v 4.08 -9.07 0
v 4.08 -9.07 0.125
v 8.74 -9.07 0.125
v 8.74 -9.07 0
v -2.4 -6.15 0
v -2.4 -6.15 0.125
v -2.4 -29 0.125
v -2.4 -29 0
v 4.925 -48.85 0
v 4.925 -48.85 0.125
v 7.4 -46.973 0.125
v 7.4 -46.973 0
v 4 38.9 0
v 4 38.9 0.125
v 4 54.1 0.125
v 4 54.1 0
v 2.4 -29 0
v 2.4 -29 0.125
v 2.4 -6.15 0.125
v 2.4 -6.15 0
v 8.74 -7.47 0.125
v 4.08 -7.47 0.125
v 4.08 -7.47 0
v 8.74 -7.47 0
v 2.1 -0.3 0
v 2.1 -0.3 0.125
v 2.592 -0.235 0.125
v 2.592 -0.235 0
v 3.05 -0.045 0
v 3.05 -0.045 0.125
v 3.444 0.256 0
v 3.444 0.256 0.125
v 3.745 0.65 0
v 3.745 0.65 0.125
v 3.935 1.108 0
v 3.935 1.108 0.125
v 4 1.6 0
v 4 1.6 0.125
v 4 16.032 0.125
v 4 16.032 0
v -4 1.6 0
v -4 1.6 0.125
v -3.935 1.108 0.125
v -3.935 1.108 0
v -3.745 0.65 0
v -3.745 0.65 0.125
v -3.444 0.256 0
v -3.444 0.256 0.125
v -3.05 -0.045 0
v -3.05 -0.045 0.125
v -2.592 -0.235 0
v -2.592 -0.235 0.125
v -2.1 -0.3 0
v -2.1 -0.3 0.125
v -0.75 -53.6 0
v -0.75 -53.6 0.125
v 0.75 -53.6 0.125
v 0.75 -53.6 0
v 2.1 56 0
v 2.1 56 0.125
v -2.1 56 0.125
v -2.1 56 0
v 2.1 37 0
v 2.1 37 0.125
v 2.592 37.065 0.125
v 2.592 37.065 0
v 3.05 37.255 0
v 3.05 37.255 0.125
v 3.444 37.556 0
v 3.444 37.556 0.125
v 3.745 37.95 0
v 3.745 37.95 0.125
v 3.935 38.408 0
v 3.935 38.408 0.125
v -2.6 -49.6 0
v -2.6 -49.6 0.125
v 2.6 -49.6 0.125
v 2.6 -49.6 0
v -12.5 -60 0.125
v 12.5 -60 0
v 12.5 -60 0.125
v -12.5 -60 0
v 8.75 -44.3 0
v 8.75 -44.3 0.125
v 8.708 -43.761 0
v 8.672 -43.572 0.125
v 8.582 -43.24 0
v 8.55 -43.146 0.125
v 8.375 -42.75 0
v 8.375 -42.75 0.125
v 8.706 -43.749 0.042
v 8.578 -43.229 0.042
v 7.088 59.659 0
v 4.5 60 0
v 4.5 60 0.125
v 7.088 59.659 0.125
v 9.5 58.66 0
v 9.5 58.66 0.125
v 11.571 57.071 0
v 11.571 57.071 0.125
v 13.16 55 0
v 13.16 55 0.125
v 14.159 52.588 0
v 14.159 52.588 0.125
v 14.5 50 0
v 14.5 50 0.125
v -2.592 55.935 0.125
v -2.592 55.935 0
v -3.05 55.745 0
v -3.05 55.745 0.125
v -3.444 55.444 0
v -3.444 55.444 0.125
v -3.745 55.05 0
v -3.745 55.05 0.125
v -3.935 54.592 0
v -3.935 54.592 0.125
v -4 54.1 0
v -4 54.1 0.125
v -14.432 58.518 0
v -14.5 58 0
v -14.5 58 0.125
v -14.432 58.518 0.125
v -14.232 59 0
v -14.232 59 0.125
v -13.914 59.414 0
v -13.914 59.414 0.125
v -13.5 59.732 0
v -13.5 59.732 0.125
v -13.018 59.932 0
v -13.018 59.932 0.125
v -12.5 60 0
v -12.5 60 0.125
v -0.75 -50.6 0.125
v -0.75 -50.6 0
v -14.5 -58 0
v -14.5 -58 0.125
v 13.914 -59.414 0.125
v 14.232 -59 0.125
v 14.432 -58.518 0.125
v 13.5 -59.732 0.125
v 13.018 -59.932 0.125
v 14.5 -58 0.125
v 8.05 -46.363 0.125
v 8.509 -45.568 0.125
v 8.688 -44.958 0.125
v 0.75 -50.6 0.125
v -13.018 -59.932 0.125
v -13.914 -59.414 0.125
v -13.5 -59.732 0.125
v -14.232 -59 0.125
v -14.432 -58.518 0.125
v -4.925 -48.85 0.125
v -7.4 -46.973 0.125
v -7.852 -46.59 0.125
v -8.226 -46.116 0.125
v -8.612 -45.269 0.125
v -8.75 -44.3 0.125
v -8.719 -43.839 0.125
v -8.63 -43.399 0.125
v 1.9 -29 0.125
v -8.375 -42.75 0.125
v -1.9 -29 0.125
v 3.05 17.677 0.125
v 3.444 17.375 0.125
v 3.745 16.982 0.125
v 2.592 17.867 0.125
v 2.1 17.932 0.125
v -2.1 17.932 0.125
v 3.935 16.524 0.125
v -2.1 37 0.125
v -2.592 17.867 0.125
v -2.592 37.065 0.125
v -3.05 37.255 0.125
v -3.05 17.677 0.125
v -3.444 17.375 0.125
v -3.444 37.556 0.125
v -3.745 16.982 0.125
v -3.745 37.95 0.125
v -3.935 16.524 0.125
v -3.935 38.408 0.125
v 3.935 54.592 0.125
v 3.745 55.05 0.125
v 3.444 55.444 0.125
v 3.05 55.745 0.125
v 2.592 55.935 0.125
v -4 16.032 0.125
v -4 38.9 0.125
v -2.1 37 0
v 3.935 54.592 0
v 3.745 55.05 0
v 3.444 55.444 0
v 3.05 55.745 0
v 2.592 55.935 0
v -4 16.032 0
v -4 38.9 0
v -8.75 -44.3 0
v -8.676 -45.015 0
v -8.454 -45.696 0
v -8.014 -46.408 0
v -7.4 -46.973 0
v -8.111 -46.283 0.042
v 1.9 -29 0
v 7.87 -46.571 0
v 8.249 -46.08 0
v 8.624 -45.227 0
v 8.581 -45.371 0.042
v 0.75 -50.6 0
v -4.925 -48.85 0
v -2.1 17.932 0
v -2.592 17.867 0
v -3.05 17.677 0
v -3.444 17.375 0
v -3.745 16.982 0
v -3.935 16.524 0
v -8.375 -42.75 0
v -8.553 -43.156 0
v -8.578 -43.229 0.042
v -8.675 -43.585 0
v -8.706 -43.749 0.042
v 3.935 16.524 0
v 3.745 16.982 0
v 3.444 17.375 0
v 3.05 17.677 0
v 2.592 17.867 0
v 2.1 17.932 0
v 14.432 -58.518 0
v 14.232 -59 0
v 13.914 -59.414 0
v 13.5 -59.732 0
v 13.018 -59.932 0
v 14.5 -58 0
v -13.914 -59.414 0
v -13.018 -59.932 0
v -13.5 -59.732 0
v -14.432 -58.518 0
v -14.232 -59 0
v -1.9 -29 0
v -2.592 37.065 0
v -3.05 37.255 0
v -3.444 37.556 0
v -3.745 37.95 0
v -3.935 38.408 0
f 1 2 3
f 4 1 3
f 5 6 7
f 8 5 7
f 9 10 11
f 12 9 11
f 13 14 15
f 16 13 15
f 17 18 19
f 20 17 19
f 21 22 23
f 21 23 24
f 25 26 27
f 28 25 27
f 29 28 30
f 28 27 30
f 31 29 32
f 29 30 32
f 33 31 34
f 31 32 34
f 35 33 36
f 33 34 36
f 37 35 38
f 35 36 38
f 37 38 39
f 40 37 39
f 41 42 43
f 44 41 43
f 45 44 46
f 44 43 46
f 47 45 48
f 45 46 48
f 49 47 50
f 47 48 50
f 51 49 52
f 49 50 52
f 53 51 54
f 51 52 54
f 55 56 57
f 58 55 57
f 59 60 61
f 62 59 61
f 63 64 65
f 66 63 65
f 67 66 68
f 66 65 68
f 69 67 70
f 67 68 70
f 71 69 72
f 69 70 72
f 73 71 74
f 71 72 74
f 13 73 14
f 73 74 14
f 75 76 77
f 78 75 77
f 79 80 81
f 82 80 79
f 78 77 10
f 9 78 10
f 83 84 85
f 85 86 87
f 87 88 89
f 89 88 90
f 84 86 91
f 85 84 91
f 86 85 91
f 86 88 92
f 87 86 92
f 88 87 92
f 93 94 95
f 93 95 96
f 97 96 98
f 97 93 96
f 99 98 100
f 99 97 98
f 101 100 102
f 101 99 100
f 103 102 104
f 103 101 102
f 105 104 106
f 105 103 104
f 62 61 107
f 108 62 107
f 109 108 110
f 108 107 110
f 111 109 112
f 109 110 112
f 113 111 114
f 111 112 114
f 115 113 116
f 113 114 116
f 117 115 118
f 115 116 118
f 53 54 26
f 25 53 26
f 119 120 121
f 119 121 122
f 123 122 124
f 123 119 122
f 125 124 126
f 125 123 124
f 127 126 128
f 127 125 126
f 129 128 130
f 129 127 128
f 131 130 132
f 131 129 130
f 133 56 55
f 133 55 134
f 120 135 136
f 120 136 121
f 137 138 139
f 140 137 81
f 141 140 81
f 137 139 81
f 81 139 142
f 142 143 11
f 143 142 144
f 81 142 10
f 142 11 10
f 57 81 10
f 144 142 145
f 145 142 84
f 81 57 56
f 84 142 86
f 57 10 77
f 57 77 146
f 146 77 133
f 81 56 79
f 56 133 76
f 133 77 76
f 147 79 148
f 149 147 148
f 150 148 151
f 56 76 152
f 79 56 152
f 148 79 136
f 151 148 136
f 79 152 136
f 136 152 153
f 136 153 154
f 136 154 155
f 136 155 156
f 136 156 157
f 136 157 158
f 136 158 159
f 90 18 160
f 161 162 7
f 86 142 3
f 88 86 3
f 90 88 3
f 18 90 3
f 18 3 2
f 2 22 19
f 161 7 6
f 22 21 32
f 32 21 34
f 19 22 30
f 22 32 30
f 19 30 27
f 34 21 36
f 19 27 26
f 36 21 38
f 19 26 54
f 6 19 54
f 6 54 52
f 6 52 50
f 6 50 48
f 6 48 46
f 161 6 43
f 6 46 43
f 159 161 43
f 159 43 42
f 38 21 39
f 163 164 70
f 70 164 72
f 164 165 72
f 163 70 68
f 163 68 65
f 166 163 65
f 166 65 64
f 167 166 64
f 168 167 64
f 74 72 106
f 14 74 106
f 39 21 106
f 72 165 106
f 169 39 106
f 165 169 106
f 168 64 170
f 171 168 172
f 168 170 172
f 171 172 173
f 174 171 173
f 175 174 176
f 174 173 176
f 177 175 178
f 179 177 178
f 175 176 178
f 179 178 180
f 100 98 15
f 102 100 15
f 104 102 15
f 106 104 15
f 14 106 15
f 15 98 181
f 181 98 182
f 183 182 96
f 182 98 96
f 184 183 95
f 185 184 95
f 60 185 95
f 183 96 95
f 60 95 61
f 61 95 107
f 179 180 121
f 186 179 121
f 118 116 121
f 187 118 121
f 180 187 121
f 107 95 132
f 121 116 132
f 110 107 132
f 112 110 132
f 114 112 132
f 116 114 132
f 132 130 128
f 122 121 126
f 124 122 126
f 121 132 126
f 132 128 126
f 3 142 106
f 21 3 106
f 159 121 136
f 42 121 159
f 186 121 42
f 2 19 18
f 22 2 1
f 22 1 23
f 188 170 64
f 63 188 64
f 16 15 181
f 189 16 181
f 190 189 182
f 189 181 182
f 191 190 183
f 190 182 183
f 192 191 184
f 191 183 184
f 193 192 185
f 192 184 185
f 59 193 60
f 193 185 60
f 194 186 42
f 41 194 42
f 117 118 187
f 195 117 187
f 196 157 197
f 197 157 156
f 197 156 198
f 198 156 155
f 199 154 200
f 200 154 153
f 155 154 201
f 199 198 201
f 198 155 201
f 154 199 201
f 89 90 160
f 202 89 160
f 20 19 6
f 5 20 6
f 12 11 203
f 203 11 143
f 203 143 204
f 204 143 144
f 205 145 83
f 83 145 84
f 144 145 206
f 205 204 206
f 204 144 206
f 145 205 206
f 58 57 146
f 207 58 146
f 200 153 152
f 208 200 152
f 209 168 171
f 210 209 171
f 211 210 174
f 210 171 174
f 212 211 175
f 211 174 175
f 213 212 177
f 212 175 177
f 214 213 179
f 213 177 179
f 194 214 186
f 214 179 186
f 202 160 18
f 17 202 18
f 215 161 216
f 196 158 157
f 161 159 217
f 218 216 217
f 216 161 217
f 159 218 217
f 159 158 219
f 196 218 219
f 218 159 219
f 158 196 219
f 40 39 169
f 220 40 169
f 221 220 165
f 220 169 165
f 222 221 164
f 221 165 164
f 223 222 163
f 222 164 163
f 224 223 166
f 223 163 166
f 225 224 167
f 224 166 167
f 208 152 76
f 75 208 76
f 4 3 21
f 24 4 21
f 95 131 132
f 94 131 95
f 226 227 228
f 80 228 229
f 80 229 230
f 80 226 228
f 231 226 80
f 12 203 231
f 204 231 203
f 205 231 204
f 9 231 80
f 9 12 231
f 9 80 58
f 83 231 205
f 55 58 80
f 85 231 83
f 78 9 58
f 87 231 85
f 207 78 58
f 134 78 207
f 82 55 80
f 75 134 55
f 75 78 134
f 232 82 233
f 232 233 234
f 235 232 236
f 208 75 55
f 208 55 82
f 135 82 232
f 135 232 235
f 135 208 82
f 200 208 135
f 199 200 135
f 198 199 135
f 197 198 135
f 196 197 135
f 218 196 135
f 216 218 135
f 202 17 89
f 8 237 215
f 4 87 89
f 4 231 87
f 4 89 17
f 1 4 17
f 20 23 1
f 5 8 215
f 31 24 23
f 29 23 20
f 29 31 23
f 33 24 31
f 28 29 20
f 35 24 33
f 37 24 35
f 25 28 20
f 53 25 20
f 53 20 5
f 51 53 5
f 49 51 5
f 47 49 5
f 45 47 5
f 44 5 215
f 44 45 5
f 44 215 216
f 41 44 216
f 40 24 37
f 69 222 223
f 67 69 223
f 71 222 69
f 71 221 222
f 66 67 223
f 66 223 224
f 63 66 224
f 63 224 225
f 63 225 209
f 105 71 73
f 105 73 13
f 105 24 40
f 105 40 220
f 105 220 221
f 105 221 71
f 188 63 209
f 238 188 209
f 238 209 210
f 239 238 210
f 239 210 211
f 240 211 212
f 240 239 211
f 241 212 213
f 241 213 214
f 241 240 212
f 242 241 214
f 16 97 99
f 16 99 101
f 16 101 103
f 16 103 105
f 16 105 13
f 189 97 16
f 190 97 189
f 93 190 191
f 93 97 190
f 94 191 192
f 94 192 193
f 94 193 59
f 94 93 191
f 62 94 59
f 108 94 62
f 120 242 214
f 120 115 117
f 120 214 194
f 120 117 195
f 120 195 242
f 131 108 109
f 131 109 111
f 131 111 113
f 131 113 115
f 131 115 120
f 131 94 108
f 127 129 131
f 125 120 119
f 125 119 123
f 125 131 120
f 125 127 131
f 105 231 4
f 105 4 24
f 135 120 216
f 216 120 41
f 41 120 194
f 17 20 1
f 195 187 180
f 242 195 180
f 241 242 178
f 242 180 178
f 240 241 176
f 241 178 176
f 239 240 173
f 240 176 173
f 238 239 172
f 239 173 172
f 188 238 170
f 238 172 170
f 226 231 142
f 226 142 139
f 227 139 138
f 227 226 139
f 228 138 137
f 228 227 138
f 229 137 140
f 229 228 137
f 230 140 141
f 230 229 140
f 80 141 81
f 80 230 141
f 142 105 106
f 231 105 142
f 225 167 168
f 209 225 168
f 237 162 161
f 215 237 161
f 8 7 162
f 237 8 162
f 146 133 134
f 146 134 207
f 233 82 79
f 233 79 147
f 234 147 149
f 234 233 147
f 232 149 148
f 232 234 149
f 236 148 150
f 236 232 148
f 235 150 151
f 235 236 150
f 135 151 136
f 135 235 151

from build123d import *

# Parameters (mm, degrees)
BOSS_EXTRUDE5_DEPTH = 0.125
SKETCH1_W           = 1.5
SKETCH1_H           = 3
SKETCH1_W_2         = 4.66
SKETCH1_H_2         = 1.6
CUT_EXTRUDE2_DEPTH  = 62.727349085


with BuildPart() as part:
    # Sketch8 → Boss-Extrude5 (new body)
    with BuildSketch(Plane.XY):
        with BuildLine():
            Line((-12.5, 60), (4.5, 60))
            ThreePointArc((4.5, 60), (11.571067812, 57.071067812), (14.5, 50))
            Line((14.5, 50), (14.5, -58))
            ThreePointArc((14.5, -58), (13.914213562, -59.414213562), (12.5, -60))
            Line((12.5, -60), (-12.5, -60))
            ThreePointArc((-12.5, -60), (-13.914213562, -59.414213562), (-14.5, -58))
            Line((-14.5, -58), (-14.5, 58))
            ThreePointArc((-14.5, 58), (-13.914213562, 59.414213562), (-12.5, 60))
        make_face()
    extrude(amount=BOSS_EXTRUDE5_DEPTH)

    # Sketch1 → Cut-Extrude2 (cut, through all)
    with BuildSketch(Plane.XY.offset(0.125)):
        with BuildLine():
            Line((2.6, -49.6), (4.925, -48.85))
            Line((4.925, -48.85), (7.4, -46.97314145))
            add(Edge.make_bspline(
                [(7.4, -46.97314145), (8.211440188, -46.416320927), (8.75059415, -45.427724457), (8.749703343, -43.736930638), (8.614001568, -43.20601542), (8.375, -42.75)],
                knots=[3, 3, 3, 3, 3.998304655, 3.998304655, 4.496755106, 4.496755106, 4.496755106, 4.496755106], degree=3))
            Line((8.375, -42.75), (1.9, -29))
            Line((1.9, -29), (2.4, -29))
            Line((2.4, -29), (2.4, -6.15))
            Line((2.4, -6.15), (-2.4, -6.15))
            Line((-2.4, -6.15), (-2.4, -29))
            Line((-2.4, -29), (-1.9, -29))
            Line((-1.9, -29), (-8.375, -42.75))
            add(Edge.make_bspline(
                [(-8.375, -42.75), (-8.614001568, -43.20601542), (-8.749703343, -43.736930638), (-8.75059415, -45.427724457), (-8.211440188, -46.416320927), (-7.4, -46.97314145)],
                knots=[2, 2, 2, 2, 3, 3, 5.002816232, 5.002816232, 5.002816232, 5.002816232], degree=3))
            Line((-7.4, -46.97314145), (-4.925, -48.85))
            Line((-4.925, -48.85), (-2.6, -49.6))
            Line((-2.6, -49.6), (2.6, -49.6))
        make_face()
        with Locations((0, -52.1)):
            Rectangle(SKETCH1_W, SKETCH1_H)
        with Locations((6.41, -8.27)):
            Rectangle(SKETCH1_W_2, SKETCH1_H_2)
        with BuildLine():
            ThreePointArc((-2.1, 17.931829774), (-3.443502884, 17.375332658), (-4, 16.031829774))
            Line((-4, 16.031829774), (-4, 1.6))
            ThreePointArc((-4, 1.6), (-3.443502884, 0.256497116), (-2.1, -0.3))
            Line((-2.1, -0.3), (2.1, -0.3))
            ThreePointArc((2.1, -0.3), (3.443502884, 0.256497116), (4, 1.6))
            Line((4, 1.6), (4, 16.031829774))
            ThreePointArc((4, 16.031829774), (3.443502884, 17.375332658), (2.1, 17.931829774))
            Line((2.1, 17.931829774), (-2.1, 17.931829774))
        make_face()
        with BuildLine():
            ThreePointArc((-2.1, 56), (-3.443502884, 55.443502884), (-4, 54.1))
            Line((-4, 54.1), (-4, 38.9))
            ThreePointArc((-4, 38.9), (-3.443502884, 37.556497116), (-2.1, 37))
            Line((-2.1, 37), (2.1, 37))
            ThreePointArc((2.1, 37), (3.443502884, 37.556497116), (4, 38.9))
            Line((4, 38.9), (4, 54.1))
            ThreePointArc((4, 54.1), (3.443502884, 55.443502884), (2.1, 56))
            Line((2.1, 56), (-2.1, 56))
        make_face()
    extrude(amount=-CUT_EXTRUDE2_DEPTH, mode=Mode.SUBTRACT)


solid = part.part
